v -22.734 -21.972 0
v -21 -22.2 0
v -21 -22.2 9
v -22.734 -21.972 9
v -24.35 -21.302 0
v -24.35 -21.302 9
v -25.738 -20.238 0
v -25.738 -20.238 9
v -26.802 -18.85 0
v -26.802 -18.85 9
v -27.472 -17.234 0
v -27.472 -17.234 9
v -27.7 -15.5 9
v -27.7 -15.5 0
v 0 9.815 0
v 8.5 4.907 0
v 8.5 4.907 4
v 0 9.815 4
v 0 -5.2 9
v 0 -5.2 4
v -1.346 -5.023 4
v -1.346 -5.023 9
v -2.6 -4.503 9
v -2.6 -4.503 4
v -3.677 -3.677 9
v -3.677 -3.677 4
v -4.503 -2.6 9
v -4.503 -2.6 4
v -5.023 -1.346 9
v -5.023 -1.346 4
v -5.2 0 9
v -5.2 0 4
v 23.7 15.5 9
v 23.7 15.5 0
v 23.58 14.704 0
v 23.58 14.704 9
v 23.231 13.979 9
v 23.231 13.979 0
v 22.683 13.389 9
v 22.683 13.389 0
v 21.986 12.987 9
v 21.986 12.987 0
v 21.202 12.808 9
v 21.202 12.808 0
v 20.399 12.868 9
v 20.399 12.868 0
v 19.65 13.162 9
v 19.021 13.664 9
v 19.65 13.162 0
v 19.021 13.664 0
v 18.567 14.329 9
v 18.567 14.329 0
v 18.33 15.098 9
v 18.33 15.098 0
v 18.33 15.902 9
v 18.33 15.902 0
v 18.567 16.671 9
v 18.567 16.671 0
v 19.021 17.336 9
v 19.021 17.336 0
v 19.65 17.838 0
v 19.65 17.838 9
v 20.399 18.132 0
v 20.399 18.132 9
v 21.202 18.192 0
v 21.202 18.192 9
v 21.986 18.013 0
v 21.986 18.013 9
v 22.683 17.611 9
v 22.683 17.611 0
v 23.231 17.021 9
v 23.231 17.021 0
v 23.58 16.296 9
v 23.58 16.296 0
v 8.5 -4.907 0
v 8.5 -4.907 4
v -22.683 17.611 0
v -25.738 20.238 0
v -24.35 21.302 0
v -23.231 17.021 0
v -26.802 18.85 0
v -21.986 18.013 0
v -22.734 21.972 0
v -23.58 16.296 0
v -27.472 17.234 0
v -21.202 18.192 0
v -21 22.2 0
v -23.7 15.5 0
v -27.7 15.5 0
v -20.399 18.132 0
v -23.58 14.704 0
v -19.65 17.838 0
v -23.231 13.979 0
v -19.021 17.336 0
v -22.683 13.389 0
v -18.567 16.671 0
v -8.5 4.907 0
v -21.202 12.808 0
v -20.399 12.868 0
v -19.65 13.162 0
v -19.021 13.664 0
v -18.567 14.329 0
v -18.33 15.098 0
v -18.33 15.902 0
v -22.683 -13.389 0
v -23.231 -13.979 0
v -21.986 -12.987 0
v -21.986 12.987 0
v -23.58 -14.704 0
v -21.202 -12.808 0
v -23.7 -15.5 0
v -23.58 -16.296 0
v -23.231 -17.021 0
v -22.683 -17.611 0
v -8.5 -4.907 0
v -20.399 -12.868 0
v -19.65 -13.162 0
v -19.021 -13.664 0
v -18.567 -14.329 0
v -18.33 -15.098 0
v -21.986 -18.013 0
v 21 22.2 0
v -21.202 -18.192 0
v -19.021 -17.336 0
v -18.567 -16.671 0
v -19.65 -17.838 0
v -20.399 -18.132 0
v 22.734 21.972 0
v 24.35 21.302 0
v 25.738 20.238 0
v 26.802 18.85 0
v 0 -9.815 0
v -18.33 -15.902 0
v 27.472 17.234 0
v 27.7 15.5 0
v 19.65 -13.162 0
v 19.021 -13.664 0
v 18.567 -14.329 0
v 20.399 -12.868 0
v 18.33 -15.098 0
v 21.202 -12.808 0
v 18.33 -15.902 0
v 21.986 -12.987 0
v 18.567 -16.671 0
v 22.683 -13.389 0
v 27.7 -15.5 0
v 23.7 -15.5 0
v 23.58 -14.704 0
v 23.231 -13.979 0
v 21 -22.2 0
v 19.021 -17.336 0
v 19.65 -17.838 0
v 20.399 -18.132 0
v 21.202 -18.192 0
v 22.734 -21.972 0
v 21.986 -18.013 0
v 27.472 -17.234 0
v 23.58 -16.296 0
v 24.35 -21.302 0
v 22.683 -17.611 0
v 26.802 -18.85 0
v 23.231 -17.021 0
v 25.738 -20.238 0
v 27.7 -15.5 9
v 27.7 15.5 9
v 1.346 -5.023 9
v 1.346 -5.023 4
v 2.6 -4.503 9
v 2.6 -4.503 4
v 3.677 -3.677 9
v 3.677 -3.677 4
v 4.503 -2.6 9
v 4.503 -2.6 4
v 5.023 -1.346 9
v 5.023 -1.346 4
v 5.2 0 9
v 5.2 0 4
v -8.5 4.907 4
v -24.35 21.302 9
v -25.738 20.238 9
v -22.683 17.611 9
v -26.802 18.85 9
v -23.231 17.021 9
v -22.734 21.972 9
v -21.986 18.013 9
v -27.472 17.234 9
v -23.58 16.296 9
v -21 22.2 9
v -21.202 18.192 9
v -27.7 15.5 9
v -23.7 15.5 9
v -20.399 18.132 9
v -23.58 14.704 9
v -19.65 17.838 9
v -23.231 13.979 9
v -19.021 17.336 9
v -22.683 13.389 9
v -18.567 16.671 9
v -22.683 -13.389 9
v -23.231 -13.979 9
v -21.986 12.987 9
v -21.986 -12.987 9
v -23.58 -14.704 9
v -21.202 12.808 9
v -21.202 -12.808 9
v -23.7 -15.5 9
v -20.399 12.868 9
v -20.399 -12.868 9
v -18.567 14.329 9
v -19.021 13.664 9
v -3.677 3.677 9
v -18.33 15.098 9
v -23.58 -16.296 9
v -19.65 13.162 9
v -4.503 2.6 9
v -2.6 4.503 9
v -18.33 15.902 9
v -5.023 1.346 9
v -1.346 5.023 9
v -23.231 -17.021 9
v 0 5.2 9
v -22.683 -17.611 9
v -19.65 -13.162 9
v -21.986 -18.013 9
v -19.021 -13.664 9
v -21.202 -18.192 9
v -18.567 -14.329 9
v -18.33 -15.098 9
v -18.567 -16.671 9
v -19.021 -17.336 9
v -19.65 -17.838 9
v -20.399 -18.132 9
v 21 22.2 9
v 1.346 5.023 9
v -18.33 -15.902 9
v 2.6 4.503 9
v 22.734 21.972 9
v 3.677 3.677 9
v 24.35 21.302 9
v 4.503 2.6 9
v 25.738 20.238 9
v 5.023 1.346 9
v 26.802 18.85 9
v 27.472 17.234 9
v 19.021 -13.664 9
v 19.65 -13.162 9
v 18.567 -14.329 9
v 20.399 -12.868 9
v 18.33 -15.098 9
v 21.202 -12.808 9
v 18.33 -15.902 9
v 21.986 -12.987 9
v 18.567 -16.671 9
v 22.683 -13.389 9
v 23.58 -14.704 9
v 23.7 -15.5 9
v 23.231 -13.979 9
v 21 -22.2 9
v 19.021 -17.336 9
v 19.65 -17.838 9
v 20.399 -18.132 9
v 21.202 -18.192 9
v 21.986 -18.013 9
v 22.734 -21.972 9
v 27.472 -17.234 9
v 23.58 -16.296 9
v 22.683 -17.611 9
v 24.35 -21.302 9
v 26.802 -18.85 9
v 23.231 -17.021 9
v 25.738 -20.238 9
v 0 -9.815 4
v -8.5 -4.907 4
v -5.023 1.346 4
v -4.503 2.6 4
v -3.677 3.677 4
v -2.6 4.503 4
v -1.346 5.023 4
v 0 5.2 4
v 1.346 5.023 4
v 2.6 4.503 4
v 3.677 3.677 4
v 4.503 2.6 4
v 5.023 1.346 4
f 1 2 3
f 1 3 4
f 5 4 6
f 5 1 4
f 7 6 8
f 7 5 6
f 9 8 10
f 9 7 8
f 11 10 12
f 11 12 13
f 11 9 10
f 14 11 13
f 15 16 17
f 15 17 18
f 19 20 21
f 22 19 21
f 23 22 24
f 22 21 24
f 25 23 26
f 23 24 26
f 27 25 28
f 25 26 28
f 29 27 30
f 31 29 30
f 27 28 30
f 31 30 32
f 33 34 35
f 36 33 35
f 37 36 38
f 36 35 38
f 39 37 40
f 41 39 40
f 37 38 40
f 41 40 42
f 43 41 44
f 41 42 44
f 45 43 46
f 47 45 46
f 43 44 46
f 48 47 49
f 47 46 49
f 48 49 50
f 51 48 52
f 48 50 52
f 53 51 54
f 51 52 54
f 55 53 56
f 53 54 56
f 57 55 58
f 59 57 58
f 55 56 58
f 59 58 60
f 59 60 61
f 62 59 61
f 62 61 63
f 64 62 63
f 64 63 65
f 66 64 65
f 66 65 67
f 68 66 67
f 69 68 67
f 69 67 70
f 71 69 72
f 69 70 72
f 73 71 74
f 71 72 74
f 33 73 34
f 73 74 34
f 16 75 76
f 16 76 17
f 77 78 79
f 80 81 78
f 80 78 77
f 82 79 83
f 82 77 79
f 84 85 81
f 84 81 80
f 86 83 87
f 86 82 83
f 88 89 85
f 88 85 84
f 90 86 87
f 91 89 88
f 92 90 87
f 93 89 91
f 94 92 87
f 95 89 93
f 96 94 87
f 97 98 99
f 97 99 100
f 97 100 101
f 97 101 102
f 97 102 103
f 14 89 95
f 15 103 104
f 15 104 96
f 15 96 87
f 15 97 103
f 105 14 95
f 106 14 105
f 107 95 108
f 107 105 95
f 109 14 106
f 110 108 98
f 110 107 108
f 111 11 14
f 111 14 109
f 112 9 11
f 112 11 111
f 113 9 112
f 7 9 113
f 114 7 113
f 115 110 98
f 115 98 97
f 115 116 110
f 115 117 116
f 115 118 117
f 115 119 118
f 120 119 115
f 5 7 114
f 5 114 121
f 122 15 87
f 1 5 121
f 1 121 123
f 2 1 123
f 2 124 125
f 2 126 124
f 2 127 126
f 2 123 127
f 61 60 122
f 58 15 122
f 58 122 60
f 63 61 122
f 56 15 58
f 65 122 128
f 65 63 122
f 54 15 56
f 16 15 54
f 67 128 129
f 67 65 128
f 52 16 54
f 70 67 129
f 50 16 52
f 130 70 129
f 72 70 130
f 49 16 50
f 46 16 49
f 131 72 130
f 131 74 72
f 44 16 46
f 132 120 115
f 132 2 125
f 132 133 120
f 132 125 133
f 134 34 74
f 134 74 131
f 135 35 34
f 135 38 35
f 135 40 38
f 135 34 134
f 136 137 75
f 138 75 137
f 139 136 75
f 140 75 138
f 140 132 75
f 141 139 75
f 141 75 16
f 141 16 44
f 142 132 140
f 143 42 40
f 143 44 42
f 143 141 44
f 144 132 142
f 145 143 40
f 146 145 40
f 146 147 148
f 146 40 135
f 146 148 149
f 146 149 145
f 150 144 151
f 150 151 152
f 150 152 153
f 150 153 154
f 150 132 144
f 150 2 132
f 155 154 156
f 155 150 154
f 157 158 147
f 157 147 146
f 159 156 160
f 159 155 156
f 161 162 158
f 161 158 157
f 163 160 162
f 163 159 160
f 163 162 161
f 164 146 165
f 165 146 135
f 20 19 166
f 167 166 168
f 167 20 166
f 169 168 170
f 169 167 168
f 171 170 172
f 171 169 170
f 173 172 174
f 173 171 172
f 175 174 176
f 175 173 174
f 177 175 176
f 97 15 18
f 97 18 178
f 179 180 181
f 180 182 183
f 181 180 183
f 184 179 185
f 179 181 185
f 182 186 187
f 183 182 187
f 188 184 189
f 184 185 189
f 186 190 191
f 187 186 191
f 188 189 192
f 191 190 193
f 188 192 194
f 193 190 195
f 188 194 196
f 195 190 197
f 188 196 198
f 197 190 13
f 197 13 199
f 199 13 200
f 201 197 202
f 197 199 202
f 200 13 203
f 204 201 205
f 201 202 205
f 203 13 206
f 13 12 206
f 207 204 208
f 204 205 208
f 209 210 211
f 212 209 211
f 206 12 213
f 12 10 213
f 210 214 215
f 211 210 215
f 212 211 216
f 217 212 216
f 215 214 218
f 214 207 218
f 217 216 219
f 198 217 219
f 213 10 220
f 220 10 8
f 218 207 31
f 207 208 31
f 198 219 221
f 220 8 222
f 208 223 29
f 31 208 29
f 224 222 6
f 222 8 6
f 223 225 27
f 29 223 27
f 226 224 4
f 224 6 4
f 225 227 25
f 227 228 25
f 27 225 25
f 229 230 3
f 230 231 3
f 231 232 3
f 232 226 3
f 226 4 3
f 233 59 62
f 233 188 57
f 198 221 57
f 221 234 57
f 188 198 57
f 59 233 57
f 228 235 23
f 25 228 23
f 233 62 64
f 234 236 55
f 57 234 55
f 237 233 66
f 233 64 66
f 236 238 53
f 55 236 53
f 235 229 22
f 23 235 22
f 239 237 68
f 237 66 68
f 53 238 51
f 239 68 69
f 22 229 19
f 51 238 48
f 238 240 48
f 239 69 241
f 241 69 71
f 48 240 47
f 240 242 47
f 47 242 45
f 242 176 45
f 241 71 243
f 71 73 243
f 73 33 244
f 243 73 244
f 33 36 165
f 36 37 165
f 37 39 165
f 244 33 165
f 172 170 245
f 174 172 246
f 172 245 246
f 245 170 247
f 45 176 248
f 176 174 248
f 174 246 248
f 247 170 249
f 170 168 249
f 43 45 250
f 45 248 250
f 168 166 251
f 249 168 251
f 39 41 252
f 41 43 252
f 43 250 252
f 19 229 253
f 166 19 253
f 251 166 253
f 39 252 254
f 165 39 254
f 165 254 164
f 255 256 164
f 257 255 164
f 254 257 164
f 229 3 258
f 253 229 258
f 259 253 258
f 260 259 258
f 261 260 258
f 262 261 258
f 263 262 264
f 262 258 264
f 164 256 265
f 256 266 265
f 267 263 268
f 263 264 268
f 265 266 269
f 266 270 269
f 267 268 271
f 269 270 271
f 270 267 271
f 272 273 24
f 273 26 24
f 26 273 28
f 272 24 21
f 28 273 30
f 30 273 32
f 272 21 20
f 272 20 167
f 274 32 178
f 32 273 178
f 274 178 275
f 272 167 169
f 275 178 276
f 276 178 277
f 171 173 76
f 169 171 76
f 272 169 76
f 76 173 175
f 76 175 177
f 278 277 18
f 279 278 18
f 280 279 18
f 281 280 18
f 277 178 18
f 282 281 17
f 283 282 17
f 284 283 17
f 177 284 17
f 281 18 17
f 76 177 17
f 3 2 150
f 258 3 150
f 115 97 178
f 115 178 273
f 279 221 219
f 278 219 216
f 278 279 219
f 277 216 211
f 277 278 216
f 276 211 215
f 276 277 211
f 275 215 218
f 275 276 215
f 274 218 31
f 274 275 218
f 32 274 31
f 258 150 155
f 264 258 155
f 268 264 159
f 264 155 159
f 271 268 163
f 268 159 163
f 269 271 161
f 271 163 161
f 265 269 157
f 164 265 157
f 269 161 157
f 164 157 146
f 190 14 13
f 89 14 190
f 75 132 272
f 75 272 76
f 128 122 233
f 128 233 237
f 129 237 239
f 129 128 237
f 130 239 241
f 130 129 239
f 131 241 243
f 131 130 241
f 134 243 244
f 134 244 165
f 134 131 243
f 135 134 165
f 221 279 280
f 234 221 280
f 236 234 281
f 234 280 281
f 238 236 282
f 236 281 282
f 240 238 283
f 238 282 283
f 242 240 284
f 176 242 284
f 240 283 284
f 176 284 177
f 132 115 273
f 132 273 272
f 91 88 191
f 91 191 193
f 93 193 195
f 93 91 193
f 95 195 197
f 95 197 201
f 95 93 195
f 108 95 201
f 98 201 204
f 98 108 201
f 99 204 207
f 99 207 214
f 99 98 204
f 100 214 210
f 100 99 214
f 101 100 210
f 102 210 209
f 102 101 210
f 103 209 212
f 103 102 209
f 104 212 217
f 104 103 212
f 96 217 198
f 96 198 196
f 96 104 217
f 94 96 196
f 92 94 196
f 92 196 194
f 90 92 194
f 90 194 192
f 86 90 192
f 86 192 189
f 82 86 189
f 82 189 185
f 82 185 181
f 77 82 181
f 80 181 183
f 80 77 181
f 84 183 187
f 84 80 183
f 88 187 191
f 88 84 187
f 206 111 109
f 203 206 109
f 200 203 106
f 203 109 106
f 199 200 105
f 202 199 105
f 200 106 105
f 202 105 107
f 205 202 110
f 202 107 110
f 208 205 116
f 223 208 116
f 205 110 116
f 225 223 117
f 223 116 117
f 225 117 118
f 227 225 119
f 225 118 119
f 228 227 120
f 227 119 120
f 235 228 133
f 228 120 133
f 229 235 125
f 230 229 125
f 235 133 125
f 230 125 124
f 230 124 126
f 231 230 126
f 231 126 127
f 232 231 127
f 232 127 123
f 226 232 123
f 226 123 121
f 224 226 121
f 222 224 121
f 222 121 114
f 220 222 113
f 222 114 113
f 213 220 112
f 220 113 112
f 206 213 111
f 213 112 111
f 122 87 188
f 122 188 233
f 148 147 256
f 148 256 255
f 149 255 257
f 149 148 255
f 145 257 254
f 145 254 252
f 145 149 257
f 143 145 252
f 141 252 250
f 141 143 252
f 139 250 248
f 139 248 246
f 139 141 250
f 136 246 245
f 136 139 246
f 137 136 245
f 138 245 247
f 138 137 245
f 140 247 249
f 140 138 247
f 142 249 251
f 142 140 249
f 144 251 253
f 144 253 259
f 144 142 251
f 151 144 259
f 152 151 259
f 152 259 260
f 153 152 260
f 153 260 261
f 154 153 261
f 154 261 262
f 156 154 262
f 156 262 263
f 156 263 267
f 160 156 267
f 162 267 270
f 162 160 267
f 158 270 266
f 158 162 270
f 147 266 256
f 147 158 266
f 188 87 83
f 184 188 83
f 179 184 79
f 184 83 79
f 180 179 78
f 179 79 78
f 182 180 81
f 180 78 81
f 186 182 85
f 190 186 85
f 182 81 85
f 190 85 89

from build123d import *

# Parameters (mm, degrees)
SKETCH_R             = 2.7
PAD_DEPTH            = 9
SKETCH_MIRRORED_2_R  = 2.7
PAD_MIRRORED_2_DEPTH = 9
POCKET_DEPTH         = 4


with BuildPart() as part:
    # Sketch → Pad (new body)
    with BuildSketch(Plane.XY):
        with BuildLine():
            ThreePointArc((0, -5.2), (3.676955, -3.676955), (5.2, 0))
            Line((5.2, 0), (27.7, 0))
            Line((27.7, 0), (27.7, -15.5))
            ThreePointArc((21, -22.2), (25.737615, -20.237615), (27.7, -15.5))
            Line((21, -22.2), (0, -22.2))
            Line((0, -22.2), (0, -5.2))
        make_face()
        with Locations((21, -15.5)):
            Circle(SKETCH_R, mode=Mode.SUBTRACT)
    pad = extrude(amount=PAD_DEPTH)

    # Sketch Mirrored 2 → Pad Mirrored 2 (add)
    with BuildSketch(Plane(origin=(0, 0, 0), x_dir=(-1, 0, 0), z_dir=(0, 0, -1))):
        with BuildLine():
            ThreePointArc((0, -5.2), (3.676955, -3.676955), (5.2, 0))
            Line((5.2, 0), (27.7, 0))
            Line((27.7, 0), (27.7, -15.5))
            ThreePointArc((21, -22.2), (25.737615, -20.237615), (27.7, -15.5))
            Line((21, -22.2), (0, -22.2))
            Line((0, -22.2), (0, -5.2))
        make_face()
        with Locations((21, -15.5)):
            Circle(SKETCH_MIRRORED_2_R, mode=Mode.SUBTRACT)
    pad_mirrored_2 = extrude(amount=-PAD_MIRRORED_2_DEPTH)

    # Mirrored001: Pad, Pad Mirrored 2 across Sketch H_Axis
    add(pad.mirror(Plane.ZX))
    add(pad_mirrored_2.mirror(Plane.ZX))

    # Sketch001 → Pocket (cut)
    with BuildSketch(Plane.XY):
        Polygon((8.5, 4.907477), (0, 9.814955), (-8.5, 4.907477), (-8.5, -4.907477), (0, -9.814955), (8.5, -4.907477), align=None)
    extrude(amount=POCKET_DEPTH, mode=Mode.SUBTRACT)


solid = part.part
